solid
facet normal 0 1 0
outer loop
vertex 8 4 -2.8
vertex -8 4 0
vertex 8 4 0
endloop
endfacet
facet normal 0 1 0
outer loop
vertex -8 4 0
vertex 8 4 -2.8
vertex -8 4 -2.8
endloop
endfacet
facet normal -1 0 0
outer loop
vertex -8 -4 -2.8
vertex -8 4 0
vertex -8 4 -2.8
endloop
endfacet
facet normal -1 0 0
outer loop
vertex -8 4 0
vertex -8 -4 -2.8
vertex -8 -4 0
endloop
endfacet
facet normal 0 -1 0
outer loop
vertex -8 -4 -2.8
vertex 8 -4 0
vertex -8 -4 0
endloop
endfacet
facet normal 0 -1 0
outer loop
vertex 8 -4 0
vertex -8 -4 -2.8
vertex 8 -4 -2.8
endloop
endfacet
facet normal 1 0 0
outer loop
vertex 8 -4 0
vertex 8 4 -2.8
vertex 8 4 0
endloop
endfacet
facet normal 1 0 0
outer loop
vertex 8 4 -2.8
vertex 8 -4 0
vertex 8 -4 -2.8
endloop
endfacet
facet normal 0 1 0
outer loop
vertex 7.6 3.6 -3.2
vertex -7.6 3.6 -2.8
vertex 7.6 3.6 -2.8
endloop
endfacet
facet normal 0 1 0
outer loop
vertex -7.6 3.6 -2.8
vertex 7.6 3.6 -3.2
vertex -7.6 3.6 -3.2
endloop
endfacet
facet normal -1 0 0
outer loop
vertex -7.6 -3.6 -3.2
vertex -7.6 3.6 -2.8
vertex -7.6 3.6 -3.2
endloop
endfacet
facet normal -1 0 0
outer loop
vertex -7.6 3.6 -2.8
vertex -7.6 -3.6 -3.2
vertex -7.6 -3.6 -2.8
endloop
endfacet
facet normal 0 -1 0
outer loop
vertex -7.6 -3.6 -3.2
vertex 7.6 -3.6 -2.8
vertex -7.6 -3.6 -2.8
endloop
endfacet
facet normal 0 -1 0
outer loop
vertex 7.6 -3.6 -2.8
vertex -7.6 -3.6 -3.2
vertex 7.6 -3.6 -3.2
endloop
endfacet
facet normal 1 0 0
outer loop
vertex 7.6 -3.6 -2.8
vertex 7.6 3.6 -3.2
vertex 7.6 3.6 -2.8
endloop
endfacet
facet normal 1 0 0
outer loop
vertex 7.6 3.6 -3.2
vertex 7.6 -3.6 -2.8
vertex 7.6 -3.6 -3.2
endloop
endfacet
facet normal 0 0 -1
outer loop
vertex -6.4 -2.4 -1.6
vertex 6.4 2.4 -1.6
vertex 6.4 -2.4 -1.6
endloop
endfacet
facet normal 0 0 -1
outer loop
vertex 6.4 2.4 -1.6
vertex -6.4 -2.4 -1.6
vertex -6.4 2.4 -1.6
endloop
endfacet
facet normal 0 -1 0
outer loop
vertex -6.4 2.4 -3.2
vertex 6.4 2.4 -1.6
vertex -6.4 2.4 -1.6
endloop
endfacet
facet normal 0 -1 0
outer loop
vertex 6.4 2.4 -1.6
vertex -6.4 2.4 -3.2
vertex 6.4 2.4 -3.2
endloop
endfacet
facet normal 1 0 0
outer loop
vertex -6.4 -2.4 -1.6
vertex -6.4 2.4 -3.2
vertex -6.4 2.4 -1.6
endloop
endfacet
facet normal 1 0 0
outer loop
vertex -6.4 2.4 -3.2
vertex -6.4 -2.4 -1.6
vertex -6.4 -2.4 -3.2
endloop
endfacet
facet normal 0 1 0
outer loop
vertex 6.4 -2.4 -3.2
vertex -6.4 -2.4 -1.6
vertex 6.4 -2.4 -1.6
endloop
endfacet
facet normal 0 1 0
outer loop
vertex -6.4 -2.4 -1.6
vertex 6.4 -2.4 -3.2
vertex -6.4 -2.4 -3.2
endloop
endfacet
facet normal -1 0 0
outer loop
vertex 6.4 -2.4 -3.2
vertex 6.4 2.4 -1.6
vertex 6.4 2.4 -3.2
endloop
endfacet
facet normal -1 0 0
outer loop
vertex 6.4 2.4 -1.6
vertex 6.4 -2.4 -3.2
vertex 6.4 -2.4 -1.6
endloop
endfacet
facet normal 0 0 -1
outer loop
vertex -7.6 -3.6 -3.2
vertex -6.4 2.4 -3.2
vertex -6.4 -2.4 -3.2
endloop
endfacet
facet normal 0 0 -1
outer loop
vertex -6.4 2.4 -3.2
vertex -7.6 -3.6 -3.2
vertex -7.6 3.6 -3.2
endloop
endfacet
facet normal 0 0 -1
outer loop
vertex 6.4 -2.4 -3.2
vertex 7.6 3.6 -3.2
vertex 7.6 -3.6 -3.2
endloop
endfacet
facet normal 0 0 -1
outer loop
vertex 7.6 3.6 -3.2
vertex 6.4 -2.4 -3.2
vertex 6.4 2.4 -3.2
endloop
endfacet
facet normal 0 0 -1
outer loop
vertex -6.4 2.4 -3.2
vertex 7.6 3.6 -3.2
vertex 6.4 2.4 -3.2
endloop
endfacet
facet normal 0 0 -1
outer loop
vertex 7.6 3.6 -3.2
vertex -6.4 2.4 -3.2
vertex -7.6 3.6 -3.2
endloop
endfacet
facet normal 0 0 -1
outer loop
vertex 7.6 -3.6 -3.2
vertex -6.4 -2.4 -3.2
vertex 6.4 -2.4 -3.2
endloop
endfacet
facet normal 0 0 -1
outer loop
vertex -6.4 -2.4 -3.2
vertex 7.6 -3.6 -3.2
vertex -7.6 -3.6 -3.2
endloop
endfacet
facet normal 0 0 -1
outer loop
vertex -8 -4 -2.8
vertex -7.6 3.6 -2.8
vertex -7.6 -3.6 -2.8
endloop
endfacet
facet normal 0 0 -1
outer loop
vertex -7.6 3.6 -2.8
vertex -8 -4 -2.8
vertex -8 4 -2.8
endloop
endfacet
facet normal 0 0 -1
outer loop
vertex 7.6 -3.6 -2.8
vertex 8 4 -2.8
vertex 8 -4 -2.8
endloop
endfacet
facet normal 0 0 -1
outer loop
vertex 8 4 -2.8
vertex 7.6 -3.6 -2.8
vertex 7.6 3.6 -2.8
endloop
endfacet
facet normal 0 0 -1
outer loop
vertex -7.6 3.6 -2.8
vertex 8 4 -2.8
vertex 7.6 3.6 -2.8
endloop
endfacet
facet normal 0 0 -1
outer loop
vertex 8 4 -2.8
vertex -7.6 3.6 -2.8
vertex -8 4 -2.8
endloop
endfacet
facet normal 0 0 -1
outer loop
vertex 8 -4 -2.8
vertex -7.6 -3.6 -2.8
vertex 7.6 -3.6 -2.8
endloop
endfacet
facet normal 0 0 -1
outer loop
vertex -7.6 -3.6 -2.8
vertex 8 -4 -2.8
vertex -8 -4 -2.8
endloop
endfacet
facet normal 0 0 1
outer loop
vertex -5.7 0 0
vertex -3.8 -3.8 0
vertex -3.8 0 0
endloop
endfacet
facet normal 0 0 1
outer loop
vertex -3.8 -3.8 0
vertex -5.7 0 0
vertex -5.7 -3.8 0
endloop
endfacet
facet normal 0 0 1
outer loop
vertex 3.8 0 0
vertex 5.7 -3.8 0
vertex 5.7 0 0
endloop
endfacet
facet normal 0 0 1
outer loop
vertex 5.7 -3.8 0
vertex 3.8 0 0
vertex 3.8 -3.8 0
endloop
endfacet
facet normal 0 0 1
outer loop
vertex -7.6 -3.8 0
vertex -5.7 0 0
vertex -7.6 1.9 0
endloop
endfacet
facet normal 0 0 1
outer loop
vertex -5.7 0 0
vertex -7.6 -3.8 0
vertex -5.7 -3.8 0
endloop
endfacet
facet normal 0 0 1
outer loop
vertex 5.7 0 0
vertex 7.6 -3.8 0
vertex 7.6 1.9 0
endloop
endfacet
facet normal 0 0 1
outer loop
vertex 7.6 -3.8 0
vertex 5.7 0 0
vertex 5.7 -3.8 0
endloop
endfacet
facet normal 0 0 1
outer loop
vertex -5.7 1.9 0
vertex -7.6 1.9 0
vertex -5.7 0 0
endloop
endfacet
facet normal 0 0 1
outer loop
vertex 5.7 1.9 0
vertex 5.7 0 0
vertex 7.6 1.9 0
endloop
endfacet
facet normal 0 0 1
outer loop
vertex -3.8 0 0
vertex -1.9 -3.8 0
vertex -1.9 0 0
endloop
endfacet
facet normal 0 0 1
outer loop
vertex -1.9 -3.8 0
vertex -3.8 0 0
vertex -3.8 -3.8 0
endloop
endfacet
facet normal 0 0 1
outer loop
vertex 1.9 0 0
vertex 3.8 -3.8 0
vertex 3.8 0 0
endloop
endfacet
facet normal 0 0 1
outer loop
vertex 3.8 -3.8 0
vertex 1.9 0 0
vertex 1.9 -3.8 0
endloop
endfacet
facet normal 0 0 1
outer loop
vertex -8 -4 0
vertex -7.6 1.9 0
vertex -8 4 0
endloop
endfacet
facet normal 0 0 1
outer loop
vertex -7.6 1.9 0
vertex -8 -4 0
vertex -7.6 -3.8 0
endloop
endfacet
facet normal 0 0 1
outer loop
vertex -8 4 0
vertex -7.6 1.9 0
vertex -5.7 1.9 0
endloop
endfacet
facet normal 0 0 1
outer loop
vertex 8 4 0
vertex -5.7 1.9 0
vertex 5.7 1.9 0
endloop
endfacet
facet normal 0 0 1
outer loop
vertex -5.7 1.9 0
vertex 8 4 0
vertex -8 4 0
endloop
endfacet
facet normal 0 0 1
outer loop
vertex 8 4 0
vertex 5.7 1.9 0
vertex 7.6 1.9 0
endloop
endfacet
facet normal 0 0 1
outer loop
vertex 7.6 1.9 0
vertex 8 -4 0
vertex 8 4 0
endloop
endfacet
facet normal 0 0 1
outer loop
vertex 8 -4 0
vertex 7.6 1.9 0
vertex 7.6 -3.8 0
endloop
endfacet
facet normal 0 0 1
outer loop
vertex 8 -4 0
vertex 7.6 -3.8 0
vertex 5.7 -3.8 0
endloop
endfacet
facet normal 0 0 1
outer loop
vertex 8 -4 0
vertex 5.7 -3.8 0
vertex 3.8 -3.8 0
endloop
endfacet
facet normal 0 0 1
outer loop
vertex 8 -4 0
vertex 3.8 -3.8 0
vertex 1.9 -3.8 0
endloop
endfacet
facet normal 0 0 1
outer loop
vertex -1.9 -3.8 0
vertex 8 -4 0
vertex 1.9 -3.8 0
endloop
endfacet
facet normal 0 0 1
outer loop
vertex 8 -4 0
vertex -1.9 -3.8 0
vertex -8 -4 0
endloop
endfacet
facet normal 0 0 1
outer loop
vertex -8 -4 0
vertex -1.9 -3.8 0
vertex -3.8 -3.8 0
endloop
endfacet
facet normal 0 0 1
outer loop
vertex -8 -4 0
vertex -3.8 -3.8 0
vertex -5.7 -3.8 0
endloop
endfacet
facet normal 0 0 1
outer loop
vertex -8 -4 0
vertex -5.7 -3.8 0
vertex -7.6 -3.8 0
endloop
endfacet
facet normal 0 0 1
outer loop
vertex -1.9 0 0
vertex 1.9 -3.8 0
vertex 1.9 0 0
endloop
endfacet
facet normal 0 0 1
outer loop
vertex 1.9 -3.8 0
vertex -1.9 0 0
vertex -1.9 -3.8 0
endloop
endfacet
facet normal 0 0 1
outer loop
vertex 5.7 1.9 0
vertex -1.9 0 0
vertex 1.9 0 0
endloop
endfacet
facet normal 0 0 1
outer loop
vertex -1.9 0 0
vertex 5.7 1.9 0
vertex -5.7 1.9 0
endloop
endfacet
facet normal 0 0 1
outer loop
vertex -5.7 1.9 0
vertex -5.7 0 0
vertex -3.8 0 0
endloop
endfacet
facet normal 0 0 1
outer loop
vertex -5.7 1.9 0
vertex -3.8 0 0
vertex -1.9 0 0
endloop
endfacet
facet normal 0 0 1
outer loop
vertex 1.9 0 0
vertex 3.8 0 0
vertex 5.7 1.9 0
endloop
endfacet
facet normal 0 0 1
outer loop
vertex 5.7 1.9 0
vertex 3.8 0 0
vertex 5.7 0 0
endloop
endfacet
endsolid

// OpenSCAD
// file: ../p/box5.scad
use <../lib.scad>
function ldraw_lib__box5() = [
// 0 Box with 5 Faces and All Edges
// 0 Name: box5.dat
// 0 Author: James Jessiman
// 0 !LDRAW_ORG Primitive UPDATE 2012-01
// 0 !LICENSE Licensed under CC BY 2.0 and CC BY 4.0 : see CAreadme.txt
// 
// 0 BFC CERTIFY CCW
  [0,"BFC","CERTIFY"],
  [0,"BFC","CCW"],
// 
// 0 !HISTORY 2002-04-03 [sbliss] Modified for BFC compliance
// 0 !HISTORY 2002-04-25 [PTadmin] Official Update 2002-02
// 0 !HISTORY 2007-06-24 [PTadmin] Header formatted for Contributor Agreement
// 0 !HISTORY 2008-07-01 [PTadmin] Official Update 2008-01
// 0 !HISTORY 2012-02-16 [Philo] Changed to CCW
// 0 !HISTORY 2012-03-30 [PTadmin] Official Update 2012-01
// 
// 
// 2 24 1 1 1 -1 1 1
  [2,24,1,1,1,-1,1,1],
// 2 24 -1 1 1 -1 1 -1
  [2,24,-1,1,1,-1,1,-1],
// 2 24 -1 1 -1 1 1 -1
  [2,24,-1,1,-1,1,1,-1],
// 2 24 1 1 -1 1 1 1
  [2,24,1,1,-1,1,1,1],
// 2 24 1 0 1 -1 0 1
  [2,24,1,0,1,-1,0,1],
// 2 24 -1 0 1 -1 0 -1
  [2,24,-1,0,1,-1,0,-1],
// 2 24 -1 0 -1 1 0 -1
  [2,24,-1,0,-1,1,0,-1],
// 2 24 1 0 -1 1 0 1
  [2,24,1,0,-1,1,0,1],
// 2 24 1 0 1 1 1 1
  [2,24,1,0,1,1,1,1],
// 2 24 -1 0 1 -1 1 1
  [2,24,-1,0,1,-1,1,1],
// 2 24 1 0 -1 1 1 -1
  [2,24,1,0,-1,1,1,-1],
// 2 24 -1 0 -1 -1 1 -1
  [2,24,-1,0,-1,-1,1,-1],
// 4 16 -1 1 1 1 1 1 1 1 -1 -1 1 -1
  [4,16,-1,1,1,1,1,1,1,1,-1,-1,1,-1],
// 4 16 -1 1 1 -1 0 1 1 0 1 1 1 1
  [4,16,-1,1,1,-1,0,1,1,0,1,1,1,1],
// 4 16 -1 1 -1 -1 0 -1 -1 0 1 -1 1 1
  [4,16,-1,1,-1,-1,0,-1,-1,0,1,-1,1,1],
// 4 16 1 1 -1 1 0 -1 -1 0 -1 -1 1 -1
  [4,16,1,1,-1,1,0,-1,-1,0,-1,-1,1,-1],
// 4 16 1 1 1 1 0 1 1 0 -1 1 1 -1
  [4,16,1,1,1,1,0,1,1,0,-1,1,1,-1],
];
makepoly(ldraw_lib__box5(), line=0.2);
// file: ../p/box4.scad
use <../lib.scad>
function ldraw_lib__box4() = [
// 0 Box with 4 Faces (2 Parallel Pairs) and All Edges
// 0 Name: box4.dat
// 0 Author: James Jessiman
// 0 !LDRAW_ORG Primitive UPDATE 2012-01
// 0 !LICENSE Licensed under CC BY 2.0 and CC BY 4.0 : see CAreadme.txt
// 
// 0 BFC CERTIFY CCW
  [0,"BFC","CERTIFY"],
  [0,"BFC","CCW"],
// 
// 0 !HISTORY 2002-04-03 [sbliss] Modified for BFC compliance
// 0 !HISTORY 2002-04-25 [PTadmin] Official Update 2002-02
// 0 !HISTORY 2007-06-24 [PTadmin] Header formatted for Contributor Agreement
// 0 !HISTORY 2008-07-01 [PTadmin] Official Update 2008-01
// 0 !HISTORY 2012-02-16 [Philo] Changed to CCW
// 0 !HISTORY 2012-03-30 [PTadmin] Official Update 2012-01
// 
// 
// 2 24 1 1 1 -1 1 1
  [2,24,1,1,1,-1,1,1],
// 2 24 -1 1 1 -1 1 -1
  [2,24,-1,1,1,-1,1,-1],
// 2 24 -1 1 -1 1 1 -1
  [2,24,-1,1,-1,1,1,-1],
// 2 24 1 1 -1 1 1 1
  [2,24,1,1,-1,1,1,1],
// 2 24 1 0 1 -1 0 1
  [2,24,1,0,1,-1,0,1],
// 2 24 -1 0 1 -1 0 -1
  [2,24,-1,0,1,-1,0,-1],
// 2 24 -1 0 -1 1 0 -1
  [2,24,-1,0,-1,1,0,-1],
// 2 24 1 0 -1 1 0 1
  [2,24,1,0,-1,1,0,1],
// 2 24 1 0 1 1 1 1
  [2,24,1,0,1,1,1,1],
// 2 24 -1 0 1 -1 1 1
  [2,24,-1,0,1,-1,1,1],
// 2 24 1 0 -1 1 1 -1
  [2,24,1,0,-1,1,1,-1],
// 2 24 -1 0 -1 -1 1 -1
  [2,24,-1,0,-1,-1,1,-1],
// 4 16 -1 1 1 -1 0 1 1 0 1 1 1 1
  [4,16,-1,1,1,-1,0,1,1,0,1,1,1,1],
// 4 16 -1 1 -1 -1 0 -1 -1 0 1 -1 1 1
  [4,16,-1,1,-1,-1,0,-1,-1,0,1,-1,1,1],
// 4 16 1 1 -1 1 0 -1 -1 0 -1 -1 1 -1
  [4,16,1,1,-1,1,0,-1,-1,0,-1,-1,1,-1],
// 4 16 1 1 1 1 0 1 1 0 -1 1 1 -1
  [4,16,1,1,1,1,0,1,1,0,-1,1,1,-1],
];
makepoly(ldraw_lib__box4(), line=0.2);
// file: s/3069bs01.scad
use <../../lib.scad>
use <../../p/box4.scad>
use <../../p/box5.scad>
function ldraw_lib__s__3069bs01() = [
// 0 ~Tile  1 x  2 with Groove without Top Face
// 0 Name: s\3069bs01.dat
// 0 Author: Santeri Piippo [arezey]
// 0 !LDRAW_ORG Subpart UPDATE 2010-02
// 0 !LICENSE Licensed under CC BY 2.0 and CC BY 4.0 : see CAreadme.txt
// 
// 0 BFC CERTIFY CCW
  [0,"BFC","CERTIFY"],
  [0,"BFC","CCW"],
// 
// 0 !HISTORY 2010-07-05 [PTadmin] Official Update 2010-02
// 
// 
// 1 16 0 0 0 20 0 0 0 7 0 0 0 10 box4.dat
  [1,16,0,0,0,20,0,0,0,7,0,0,0,10, ldraw_lib__box4()],
// 1 16 0 7 0 19 0 0 0 1 0 0 0 9 box4.dat
  [1,16,0,7,0,19,0,0,0,1,0,0,0,9, ldraw_lib__box4()],
// 0 BFC INVERTNEXT
  [0,"BFC","INVERTNEXT"],
// 1 16 0 8 0 16 0 0 0 -4 0 0 0 6 box5.dat
  [1,16,0,8,0,16,0,0,0,-4,0,0,0,6, ldraw_lib__box5()],
// 4 16 -19 8 9 -16 8 6 -16 8 -6 -19 8 -9
  [4,16,-19,8,9,-16,8,6,-16,8,-6,-19,8,-9],
// 4 16 19 8 -9 16 8 -6 16 8 6 19 8 9
  [4,16,19,8,-9,16,8,-6,16,8,6,19,8,9],
// 4 16 19 8 9 16 8 6 -16 8 6 -19 8 9
  [4,16,19,8,9,16,8,6,-16,8,6,-19,8,9],
// 4 16 -19 8 -9 -16 8 -6 16 8 -6 19 8 -9
  [4,16,-19,8,-9,-16,8,-6,16,8,-6,19,8,-9],
// 4 16 -20 7 10 -19 7 9 -19 7 -9 -20 7 -10
  [4,16,-20,7,10,-19,7,9,-19,7,-9,-20,7,-10],
// 4 16 20 7 -10 19 7 -9 19 7 9 20 7 10
  [4,16,20,7,-10,19,7,-9,19,7,9,20,7,10],
// 4 16 20 7 10 19 7 9 -19 7 9 -20 7 10
  [4,16,20,7,10,19,7,9,-19,7,9,-20,7,10],
// 4 16 -20 7 -10 -19 7 -9 19 7 -9 20 7 -10
  [4,16,-20,7,-10,-19,7,-9,19,7,-9,20,7,-10],
// 0 //
];
makepoly(ldraw_lib__s__3069bs01(), line=0.2);
// main file
use <../lib.scad>
use <s/3069bs01.scad>
function ldraw_lib__3069bpx6() = [
// 0 Tile  1 x  2 with and Purple and Bright Pink Squares Pattern
// 0 Name: 3069bpx6.dat
// 0 Author: Vincent Messenet [Cheenzo]
// 0 !LDRAW_ORG Part UPDATE 2022-04
// 0 !LICENSE Licensed under CC BY 2.0 and CC BY 4.0 : see CAreadme.txt
// 
// 0 BFC CERTIFY CCW
  [0,"BFC","CERTIFY"],
  [0,"BFC","CCW"],
// 
// 0 !KEYWORDS BrickLink 3069bpb0700, dragon, Minecraft, Set 21151
// 
// 0 !HISTORY 2022-07-18 [PTadmin] Official Update 2022-04
// 
// 
// 1 16 0 0 0 1 0 0 0 1 0 0 0 1 s\3069bs01.dat
  [1,16,0,0,0,1,0,0,0,1,0,0,0,1, ldraw_lib__s__3069bs01()],
// 
// 4 26 -14.25 0 0 -14.25 0 -9.5 -9.5 0 -9.5 -9.5 0 0
  [4,26,-14.25,0,0,-14.25,0,-9.5,-9.5,0,-9.5,-9.5,0,0],
// 4 26 9.5 0 0 9.5 0 -9.5 14.25 0 -9.5 14.25 0 0
  [4,26,9.5,0,0,9.5,0,-9.5,14.25,0,-9.5,14.25,0,0],
// 4 77 -19 0 -9.5 -14.25 0 -9.5 -14.25 0 0 -19 0 4.75
  [4,77,-19,0,-9.5,-14.25,0,-9.5,-14.25,0,0,-19,0,4.75],
// 4 77 19 0 4.75 14.25 0 0 14.25 0 -9.5 19 0 -9.5
  [4,77,19,0,4.75,14.25,0,0,14.25,0,-9.5,19,0,-9.5],
// 3 77 -14.25 0 4.75 -19 0 4.75 -14.25 0 0
  [3,77,-14.25,0,4.75,-19,0,4.75,-14.25,0,0],
// 3 77 14.25 0 4.75 14.25 0 0 19 0 4.75
  [3,77,14.25,0,4.75,14.25,0,0,19,0,4.75],
// 4 77 -4.75 0 0 -9.5 0 0 -9.5 0 -9.5 -4.75 0 -9.5
  [4,77,-4.75,0,0,-9.5,0,0,-9.5,0,-9.5,-4.75,0,-9.5],
// 4 77 9.5 0 -9.5 9.5 0 0 4.75 0 0 4.75 0 -9.5
  [4,77,9.5,0,-9.5,9.5,0,0,4.75,0,0,4.75,0,-9.5],
// 4 16 -19 0 -9.5 -19 0 4.75 -20 0 10 -20 0 -10
  [4,16,-19,0,-9.5,-19,0,4.75,-20,0,10,-20,0,-10],
// 3 16 -20 0 10 -19 0 4.75 -14.25 0 4.75
  [3,16,-20,0,10,-19,0,4.75,-14.25,0,4.75],
// 4 16 -20 0 10 -14.25 0 4.75 14.25 0 4.75 20 0 10
  [4,16,-20,0,10,-14.25,0,4.75,14.25,0,4.75,20,0,10],
// 3 16 20 0 10 14.25 0 4.75 19 0 4.75
  [3,16,20,0,10,14.25,0,4.75,19,0,4.75],
// 4 16 20 0 10 19 0 4.75 19 0 -9.5 20 0 -10
  [4,16,20,0,10,19,0,4.75,19,0,-9.5,20,0,-10],
// 3 16 20 0 -10 19 0 -9.5 14.25 0 -9.5
  [3,16,20,0,-10,19,0,-9.5,14.25,0,-9.5],
// 3 16 20 0 -10 14.25 0 -9.5 9.5 0 -9.5
  [3,16,20,0,-10,14.25,0,-9.5,9.5,0,-9.5],
// 3 16 20 0 -10 9.5 0 -9.5 4.75 0 -9.5
  [3,16,20,0,-10,9.5,0,-9.5,4.75,0,-9.5],
// 4 16 20 0 -10 4.75 0 -9.5 -4.75 0 -9.5 -20 0 -10
  [4,16,20,0,-10,4.75,0,-9.5,-4.75,0,-9.5,-20,0,-10],
// 3 16 -20 0 -10 -4.75 0 -9.5 -9.5 0 -9.5
  [3,16,-20,0,-10,-4.75,0,-9.5,-9.5,0,-9.5],
// 3 16 -20 0 -10 -9.5 0 -9.5 -14.25 0 -9.5
  [3,16,-20,0,-10,-9.5,0,-9.5,-14.25,0,-9.5],
// 3 16 -20 0 -10 -14.25 0 -9.5 -19 0 -9.5
  [3,16,-20,0,-10,-14.25,0,-9.5,-19,0,-9.5],
// 4 16 -4.75 0 0 -4.75 0 -9.5 4.75 0 -9.5 4.75 0 0
  [4,16,-4.75,0,0,-4.75,0,-9.5,4.75,0,-9.5,4.75,0,0],
// 4 16 -14.25 0 4.75 -4.75 0 0 4.75 0 0 14.25 0 4.75
  [4,16,-14.25,0,4.75,-4.75,0,0,4.75,0,0,14.25,0,4.75],
// 3 16 -14.25 0 4.75 -14.25 0 0 -9.5 0 0
  [3,16,-14.25,0,4.75,-14.25,0,0,-9.5,0,0],
// 3 16 -14.25 0 4.75 -9.5 0 0 -4.75 0 0
  [3,16,-14.25,0,4.75,-9.5,0,0,-4.75,0,0],
// 3 16 4.75 0 0 9.5 0 0 14.25 0 4.75
  [3,16,4.75,0,0,9.5,0,0,14.25,0,4.75],
// 3 16 14.25 0 4.75 9.5 0 0 14.25 0 0
  [3,16,14.25,0,4.75,9.5,0,0,14.25,0,0],
];
makepoly(ldraw_lib__3069bpx6(), line=0.2);
